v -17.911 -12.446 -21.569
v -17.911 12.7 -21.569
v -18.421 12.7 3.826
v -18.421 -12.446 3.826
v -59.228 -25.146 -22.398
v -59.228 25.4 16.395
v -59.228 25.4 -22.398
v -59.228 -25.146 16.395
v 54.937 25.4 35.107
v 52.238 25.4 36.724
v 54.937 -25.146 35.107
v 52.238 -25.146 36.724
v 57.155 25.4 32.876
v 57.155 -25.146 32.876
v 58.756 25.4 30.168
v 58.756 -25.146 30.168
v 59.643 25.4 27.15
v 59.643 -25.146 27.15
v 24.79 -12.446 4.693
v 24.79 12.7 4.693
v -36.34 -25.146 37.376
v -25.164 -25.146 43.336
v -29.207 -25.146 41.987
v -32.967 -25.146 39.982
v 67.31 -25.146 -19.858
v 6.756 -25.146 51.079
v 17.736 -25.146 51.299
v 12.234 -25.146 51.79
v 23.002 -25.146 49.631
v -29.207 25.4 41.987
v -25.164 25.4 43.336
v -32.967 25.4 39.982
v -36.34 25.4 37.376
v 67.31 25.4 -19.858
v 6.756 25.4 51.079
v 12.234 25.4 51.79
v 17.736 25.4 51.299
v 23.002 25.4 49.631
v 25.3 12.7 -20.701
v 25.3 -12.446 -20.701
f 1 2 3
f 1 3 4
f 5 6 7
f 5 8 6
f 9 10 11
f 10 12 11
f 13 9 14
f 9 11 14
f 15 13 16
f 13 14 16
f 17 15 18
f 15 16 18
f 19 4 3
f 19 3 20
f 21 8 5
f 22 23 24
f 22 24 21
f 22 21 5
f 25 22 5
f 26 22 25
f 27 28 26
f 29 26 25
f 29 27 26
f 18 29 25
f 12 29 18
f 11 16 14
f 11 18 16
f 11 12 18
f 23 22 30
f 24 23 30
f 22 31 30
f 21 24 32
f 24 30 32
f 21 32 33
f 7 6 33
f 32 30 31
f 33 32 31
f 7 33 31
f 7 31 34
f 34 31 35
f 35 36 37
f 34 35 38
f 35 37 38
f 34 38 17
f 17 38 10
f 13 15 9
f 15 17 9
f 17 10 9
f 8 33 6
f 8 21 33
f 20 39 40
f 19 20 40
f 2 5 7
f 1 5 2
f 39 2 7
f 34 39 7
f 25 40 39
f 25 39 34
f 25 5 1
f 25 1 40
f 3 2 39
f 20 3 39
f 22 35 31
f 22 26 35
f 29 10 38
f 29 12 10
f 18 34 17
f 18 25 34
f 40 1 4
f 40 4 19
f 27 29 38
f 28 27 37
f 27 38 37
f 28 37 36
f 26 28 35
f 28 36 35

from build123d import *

# Parameters (mm, degrees)
F1_DEPTH      = 25.146
F1_DEPTH_BACK = 25.4
F2_R          = 12.7
F3_R          = 25.4
F4_W          = 43.2194133058
F4_H          = 25.146
F5_DEPTH      = 25.4


with BuildPart() as f1:
    # F0 (on Front) → F1 (new body, two sides)
    with BuildSketch(Plane.XZ) as f1_sk:
        Polygon((-59.228181839, 16.3945462555), (-59.228181839, -22.3981812596), (67.3100054264, -19.8581814766), (58.5354566574, 33.9436382055), (15.12454357, 53.1090945005), (-31.5190926194, 41.7945459485), align=None)
    extrude(amount=F1_DEPTH)
    extrude(f1_sk.sketch, amount=-F1_DEPTH_BACK)

    # F2
    f2_edges = [f1.edges().sort_by_distance(p)[0] for p in [
        (58.535457, 0.127, 33.943638),
    ]]
    fillet(f2_edges, radius=F2_R)

    # F3
    f3_edges = [f1.edges().sort_by_distance(p)[0] for p in [
        (-31.519093, 0.127, 41.794546),
        (15.124544, 0.127, 53.109095),
    ]]
    fillet(f3_edges, radius=F3_R)

    # F4 (on face) → F5 (cut)
    with BuildSketch(Plane(origin=(0.4255624903, 0, -21.200752239), x_dir=(0.9997985984, 0, 0.0200689474), z_dir=(0.0200689474, 0, -0.9997985984))):
        with Locations((3.2696425915, -0.127)):
            Rectangle(F4_W, F4_H)
    extrude(amount=-F5_DEPTH, mode=Mode.SUBTRACT)


solid = f1.part
